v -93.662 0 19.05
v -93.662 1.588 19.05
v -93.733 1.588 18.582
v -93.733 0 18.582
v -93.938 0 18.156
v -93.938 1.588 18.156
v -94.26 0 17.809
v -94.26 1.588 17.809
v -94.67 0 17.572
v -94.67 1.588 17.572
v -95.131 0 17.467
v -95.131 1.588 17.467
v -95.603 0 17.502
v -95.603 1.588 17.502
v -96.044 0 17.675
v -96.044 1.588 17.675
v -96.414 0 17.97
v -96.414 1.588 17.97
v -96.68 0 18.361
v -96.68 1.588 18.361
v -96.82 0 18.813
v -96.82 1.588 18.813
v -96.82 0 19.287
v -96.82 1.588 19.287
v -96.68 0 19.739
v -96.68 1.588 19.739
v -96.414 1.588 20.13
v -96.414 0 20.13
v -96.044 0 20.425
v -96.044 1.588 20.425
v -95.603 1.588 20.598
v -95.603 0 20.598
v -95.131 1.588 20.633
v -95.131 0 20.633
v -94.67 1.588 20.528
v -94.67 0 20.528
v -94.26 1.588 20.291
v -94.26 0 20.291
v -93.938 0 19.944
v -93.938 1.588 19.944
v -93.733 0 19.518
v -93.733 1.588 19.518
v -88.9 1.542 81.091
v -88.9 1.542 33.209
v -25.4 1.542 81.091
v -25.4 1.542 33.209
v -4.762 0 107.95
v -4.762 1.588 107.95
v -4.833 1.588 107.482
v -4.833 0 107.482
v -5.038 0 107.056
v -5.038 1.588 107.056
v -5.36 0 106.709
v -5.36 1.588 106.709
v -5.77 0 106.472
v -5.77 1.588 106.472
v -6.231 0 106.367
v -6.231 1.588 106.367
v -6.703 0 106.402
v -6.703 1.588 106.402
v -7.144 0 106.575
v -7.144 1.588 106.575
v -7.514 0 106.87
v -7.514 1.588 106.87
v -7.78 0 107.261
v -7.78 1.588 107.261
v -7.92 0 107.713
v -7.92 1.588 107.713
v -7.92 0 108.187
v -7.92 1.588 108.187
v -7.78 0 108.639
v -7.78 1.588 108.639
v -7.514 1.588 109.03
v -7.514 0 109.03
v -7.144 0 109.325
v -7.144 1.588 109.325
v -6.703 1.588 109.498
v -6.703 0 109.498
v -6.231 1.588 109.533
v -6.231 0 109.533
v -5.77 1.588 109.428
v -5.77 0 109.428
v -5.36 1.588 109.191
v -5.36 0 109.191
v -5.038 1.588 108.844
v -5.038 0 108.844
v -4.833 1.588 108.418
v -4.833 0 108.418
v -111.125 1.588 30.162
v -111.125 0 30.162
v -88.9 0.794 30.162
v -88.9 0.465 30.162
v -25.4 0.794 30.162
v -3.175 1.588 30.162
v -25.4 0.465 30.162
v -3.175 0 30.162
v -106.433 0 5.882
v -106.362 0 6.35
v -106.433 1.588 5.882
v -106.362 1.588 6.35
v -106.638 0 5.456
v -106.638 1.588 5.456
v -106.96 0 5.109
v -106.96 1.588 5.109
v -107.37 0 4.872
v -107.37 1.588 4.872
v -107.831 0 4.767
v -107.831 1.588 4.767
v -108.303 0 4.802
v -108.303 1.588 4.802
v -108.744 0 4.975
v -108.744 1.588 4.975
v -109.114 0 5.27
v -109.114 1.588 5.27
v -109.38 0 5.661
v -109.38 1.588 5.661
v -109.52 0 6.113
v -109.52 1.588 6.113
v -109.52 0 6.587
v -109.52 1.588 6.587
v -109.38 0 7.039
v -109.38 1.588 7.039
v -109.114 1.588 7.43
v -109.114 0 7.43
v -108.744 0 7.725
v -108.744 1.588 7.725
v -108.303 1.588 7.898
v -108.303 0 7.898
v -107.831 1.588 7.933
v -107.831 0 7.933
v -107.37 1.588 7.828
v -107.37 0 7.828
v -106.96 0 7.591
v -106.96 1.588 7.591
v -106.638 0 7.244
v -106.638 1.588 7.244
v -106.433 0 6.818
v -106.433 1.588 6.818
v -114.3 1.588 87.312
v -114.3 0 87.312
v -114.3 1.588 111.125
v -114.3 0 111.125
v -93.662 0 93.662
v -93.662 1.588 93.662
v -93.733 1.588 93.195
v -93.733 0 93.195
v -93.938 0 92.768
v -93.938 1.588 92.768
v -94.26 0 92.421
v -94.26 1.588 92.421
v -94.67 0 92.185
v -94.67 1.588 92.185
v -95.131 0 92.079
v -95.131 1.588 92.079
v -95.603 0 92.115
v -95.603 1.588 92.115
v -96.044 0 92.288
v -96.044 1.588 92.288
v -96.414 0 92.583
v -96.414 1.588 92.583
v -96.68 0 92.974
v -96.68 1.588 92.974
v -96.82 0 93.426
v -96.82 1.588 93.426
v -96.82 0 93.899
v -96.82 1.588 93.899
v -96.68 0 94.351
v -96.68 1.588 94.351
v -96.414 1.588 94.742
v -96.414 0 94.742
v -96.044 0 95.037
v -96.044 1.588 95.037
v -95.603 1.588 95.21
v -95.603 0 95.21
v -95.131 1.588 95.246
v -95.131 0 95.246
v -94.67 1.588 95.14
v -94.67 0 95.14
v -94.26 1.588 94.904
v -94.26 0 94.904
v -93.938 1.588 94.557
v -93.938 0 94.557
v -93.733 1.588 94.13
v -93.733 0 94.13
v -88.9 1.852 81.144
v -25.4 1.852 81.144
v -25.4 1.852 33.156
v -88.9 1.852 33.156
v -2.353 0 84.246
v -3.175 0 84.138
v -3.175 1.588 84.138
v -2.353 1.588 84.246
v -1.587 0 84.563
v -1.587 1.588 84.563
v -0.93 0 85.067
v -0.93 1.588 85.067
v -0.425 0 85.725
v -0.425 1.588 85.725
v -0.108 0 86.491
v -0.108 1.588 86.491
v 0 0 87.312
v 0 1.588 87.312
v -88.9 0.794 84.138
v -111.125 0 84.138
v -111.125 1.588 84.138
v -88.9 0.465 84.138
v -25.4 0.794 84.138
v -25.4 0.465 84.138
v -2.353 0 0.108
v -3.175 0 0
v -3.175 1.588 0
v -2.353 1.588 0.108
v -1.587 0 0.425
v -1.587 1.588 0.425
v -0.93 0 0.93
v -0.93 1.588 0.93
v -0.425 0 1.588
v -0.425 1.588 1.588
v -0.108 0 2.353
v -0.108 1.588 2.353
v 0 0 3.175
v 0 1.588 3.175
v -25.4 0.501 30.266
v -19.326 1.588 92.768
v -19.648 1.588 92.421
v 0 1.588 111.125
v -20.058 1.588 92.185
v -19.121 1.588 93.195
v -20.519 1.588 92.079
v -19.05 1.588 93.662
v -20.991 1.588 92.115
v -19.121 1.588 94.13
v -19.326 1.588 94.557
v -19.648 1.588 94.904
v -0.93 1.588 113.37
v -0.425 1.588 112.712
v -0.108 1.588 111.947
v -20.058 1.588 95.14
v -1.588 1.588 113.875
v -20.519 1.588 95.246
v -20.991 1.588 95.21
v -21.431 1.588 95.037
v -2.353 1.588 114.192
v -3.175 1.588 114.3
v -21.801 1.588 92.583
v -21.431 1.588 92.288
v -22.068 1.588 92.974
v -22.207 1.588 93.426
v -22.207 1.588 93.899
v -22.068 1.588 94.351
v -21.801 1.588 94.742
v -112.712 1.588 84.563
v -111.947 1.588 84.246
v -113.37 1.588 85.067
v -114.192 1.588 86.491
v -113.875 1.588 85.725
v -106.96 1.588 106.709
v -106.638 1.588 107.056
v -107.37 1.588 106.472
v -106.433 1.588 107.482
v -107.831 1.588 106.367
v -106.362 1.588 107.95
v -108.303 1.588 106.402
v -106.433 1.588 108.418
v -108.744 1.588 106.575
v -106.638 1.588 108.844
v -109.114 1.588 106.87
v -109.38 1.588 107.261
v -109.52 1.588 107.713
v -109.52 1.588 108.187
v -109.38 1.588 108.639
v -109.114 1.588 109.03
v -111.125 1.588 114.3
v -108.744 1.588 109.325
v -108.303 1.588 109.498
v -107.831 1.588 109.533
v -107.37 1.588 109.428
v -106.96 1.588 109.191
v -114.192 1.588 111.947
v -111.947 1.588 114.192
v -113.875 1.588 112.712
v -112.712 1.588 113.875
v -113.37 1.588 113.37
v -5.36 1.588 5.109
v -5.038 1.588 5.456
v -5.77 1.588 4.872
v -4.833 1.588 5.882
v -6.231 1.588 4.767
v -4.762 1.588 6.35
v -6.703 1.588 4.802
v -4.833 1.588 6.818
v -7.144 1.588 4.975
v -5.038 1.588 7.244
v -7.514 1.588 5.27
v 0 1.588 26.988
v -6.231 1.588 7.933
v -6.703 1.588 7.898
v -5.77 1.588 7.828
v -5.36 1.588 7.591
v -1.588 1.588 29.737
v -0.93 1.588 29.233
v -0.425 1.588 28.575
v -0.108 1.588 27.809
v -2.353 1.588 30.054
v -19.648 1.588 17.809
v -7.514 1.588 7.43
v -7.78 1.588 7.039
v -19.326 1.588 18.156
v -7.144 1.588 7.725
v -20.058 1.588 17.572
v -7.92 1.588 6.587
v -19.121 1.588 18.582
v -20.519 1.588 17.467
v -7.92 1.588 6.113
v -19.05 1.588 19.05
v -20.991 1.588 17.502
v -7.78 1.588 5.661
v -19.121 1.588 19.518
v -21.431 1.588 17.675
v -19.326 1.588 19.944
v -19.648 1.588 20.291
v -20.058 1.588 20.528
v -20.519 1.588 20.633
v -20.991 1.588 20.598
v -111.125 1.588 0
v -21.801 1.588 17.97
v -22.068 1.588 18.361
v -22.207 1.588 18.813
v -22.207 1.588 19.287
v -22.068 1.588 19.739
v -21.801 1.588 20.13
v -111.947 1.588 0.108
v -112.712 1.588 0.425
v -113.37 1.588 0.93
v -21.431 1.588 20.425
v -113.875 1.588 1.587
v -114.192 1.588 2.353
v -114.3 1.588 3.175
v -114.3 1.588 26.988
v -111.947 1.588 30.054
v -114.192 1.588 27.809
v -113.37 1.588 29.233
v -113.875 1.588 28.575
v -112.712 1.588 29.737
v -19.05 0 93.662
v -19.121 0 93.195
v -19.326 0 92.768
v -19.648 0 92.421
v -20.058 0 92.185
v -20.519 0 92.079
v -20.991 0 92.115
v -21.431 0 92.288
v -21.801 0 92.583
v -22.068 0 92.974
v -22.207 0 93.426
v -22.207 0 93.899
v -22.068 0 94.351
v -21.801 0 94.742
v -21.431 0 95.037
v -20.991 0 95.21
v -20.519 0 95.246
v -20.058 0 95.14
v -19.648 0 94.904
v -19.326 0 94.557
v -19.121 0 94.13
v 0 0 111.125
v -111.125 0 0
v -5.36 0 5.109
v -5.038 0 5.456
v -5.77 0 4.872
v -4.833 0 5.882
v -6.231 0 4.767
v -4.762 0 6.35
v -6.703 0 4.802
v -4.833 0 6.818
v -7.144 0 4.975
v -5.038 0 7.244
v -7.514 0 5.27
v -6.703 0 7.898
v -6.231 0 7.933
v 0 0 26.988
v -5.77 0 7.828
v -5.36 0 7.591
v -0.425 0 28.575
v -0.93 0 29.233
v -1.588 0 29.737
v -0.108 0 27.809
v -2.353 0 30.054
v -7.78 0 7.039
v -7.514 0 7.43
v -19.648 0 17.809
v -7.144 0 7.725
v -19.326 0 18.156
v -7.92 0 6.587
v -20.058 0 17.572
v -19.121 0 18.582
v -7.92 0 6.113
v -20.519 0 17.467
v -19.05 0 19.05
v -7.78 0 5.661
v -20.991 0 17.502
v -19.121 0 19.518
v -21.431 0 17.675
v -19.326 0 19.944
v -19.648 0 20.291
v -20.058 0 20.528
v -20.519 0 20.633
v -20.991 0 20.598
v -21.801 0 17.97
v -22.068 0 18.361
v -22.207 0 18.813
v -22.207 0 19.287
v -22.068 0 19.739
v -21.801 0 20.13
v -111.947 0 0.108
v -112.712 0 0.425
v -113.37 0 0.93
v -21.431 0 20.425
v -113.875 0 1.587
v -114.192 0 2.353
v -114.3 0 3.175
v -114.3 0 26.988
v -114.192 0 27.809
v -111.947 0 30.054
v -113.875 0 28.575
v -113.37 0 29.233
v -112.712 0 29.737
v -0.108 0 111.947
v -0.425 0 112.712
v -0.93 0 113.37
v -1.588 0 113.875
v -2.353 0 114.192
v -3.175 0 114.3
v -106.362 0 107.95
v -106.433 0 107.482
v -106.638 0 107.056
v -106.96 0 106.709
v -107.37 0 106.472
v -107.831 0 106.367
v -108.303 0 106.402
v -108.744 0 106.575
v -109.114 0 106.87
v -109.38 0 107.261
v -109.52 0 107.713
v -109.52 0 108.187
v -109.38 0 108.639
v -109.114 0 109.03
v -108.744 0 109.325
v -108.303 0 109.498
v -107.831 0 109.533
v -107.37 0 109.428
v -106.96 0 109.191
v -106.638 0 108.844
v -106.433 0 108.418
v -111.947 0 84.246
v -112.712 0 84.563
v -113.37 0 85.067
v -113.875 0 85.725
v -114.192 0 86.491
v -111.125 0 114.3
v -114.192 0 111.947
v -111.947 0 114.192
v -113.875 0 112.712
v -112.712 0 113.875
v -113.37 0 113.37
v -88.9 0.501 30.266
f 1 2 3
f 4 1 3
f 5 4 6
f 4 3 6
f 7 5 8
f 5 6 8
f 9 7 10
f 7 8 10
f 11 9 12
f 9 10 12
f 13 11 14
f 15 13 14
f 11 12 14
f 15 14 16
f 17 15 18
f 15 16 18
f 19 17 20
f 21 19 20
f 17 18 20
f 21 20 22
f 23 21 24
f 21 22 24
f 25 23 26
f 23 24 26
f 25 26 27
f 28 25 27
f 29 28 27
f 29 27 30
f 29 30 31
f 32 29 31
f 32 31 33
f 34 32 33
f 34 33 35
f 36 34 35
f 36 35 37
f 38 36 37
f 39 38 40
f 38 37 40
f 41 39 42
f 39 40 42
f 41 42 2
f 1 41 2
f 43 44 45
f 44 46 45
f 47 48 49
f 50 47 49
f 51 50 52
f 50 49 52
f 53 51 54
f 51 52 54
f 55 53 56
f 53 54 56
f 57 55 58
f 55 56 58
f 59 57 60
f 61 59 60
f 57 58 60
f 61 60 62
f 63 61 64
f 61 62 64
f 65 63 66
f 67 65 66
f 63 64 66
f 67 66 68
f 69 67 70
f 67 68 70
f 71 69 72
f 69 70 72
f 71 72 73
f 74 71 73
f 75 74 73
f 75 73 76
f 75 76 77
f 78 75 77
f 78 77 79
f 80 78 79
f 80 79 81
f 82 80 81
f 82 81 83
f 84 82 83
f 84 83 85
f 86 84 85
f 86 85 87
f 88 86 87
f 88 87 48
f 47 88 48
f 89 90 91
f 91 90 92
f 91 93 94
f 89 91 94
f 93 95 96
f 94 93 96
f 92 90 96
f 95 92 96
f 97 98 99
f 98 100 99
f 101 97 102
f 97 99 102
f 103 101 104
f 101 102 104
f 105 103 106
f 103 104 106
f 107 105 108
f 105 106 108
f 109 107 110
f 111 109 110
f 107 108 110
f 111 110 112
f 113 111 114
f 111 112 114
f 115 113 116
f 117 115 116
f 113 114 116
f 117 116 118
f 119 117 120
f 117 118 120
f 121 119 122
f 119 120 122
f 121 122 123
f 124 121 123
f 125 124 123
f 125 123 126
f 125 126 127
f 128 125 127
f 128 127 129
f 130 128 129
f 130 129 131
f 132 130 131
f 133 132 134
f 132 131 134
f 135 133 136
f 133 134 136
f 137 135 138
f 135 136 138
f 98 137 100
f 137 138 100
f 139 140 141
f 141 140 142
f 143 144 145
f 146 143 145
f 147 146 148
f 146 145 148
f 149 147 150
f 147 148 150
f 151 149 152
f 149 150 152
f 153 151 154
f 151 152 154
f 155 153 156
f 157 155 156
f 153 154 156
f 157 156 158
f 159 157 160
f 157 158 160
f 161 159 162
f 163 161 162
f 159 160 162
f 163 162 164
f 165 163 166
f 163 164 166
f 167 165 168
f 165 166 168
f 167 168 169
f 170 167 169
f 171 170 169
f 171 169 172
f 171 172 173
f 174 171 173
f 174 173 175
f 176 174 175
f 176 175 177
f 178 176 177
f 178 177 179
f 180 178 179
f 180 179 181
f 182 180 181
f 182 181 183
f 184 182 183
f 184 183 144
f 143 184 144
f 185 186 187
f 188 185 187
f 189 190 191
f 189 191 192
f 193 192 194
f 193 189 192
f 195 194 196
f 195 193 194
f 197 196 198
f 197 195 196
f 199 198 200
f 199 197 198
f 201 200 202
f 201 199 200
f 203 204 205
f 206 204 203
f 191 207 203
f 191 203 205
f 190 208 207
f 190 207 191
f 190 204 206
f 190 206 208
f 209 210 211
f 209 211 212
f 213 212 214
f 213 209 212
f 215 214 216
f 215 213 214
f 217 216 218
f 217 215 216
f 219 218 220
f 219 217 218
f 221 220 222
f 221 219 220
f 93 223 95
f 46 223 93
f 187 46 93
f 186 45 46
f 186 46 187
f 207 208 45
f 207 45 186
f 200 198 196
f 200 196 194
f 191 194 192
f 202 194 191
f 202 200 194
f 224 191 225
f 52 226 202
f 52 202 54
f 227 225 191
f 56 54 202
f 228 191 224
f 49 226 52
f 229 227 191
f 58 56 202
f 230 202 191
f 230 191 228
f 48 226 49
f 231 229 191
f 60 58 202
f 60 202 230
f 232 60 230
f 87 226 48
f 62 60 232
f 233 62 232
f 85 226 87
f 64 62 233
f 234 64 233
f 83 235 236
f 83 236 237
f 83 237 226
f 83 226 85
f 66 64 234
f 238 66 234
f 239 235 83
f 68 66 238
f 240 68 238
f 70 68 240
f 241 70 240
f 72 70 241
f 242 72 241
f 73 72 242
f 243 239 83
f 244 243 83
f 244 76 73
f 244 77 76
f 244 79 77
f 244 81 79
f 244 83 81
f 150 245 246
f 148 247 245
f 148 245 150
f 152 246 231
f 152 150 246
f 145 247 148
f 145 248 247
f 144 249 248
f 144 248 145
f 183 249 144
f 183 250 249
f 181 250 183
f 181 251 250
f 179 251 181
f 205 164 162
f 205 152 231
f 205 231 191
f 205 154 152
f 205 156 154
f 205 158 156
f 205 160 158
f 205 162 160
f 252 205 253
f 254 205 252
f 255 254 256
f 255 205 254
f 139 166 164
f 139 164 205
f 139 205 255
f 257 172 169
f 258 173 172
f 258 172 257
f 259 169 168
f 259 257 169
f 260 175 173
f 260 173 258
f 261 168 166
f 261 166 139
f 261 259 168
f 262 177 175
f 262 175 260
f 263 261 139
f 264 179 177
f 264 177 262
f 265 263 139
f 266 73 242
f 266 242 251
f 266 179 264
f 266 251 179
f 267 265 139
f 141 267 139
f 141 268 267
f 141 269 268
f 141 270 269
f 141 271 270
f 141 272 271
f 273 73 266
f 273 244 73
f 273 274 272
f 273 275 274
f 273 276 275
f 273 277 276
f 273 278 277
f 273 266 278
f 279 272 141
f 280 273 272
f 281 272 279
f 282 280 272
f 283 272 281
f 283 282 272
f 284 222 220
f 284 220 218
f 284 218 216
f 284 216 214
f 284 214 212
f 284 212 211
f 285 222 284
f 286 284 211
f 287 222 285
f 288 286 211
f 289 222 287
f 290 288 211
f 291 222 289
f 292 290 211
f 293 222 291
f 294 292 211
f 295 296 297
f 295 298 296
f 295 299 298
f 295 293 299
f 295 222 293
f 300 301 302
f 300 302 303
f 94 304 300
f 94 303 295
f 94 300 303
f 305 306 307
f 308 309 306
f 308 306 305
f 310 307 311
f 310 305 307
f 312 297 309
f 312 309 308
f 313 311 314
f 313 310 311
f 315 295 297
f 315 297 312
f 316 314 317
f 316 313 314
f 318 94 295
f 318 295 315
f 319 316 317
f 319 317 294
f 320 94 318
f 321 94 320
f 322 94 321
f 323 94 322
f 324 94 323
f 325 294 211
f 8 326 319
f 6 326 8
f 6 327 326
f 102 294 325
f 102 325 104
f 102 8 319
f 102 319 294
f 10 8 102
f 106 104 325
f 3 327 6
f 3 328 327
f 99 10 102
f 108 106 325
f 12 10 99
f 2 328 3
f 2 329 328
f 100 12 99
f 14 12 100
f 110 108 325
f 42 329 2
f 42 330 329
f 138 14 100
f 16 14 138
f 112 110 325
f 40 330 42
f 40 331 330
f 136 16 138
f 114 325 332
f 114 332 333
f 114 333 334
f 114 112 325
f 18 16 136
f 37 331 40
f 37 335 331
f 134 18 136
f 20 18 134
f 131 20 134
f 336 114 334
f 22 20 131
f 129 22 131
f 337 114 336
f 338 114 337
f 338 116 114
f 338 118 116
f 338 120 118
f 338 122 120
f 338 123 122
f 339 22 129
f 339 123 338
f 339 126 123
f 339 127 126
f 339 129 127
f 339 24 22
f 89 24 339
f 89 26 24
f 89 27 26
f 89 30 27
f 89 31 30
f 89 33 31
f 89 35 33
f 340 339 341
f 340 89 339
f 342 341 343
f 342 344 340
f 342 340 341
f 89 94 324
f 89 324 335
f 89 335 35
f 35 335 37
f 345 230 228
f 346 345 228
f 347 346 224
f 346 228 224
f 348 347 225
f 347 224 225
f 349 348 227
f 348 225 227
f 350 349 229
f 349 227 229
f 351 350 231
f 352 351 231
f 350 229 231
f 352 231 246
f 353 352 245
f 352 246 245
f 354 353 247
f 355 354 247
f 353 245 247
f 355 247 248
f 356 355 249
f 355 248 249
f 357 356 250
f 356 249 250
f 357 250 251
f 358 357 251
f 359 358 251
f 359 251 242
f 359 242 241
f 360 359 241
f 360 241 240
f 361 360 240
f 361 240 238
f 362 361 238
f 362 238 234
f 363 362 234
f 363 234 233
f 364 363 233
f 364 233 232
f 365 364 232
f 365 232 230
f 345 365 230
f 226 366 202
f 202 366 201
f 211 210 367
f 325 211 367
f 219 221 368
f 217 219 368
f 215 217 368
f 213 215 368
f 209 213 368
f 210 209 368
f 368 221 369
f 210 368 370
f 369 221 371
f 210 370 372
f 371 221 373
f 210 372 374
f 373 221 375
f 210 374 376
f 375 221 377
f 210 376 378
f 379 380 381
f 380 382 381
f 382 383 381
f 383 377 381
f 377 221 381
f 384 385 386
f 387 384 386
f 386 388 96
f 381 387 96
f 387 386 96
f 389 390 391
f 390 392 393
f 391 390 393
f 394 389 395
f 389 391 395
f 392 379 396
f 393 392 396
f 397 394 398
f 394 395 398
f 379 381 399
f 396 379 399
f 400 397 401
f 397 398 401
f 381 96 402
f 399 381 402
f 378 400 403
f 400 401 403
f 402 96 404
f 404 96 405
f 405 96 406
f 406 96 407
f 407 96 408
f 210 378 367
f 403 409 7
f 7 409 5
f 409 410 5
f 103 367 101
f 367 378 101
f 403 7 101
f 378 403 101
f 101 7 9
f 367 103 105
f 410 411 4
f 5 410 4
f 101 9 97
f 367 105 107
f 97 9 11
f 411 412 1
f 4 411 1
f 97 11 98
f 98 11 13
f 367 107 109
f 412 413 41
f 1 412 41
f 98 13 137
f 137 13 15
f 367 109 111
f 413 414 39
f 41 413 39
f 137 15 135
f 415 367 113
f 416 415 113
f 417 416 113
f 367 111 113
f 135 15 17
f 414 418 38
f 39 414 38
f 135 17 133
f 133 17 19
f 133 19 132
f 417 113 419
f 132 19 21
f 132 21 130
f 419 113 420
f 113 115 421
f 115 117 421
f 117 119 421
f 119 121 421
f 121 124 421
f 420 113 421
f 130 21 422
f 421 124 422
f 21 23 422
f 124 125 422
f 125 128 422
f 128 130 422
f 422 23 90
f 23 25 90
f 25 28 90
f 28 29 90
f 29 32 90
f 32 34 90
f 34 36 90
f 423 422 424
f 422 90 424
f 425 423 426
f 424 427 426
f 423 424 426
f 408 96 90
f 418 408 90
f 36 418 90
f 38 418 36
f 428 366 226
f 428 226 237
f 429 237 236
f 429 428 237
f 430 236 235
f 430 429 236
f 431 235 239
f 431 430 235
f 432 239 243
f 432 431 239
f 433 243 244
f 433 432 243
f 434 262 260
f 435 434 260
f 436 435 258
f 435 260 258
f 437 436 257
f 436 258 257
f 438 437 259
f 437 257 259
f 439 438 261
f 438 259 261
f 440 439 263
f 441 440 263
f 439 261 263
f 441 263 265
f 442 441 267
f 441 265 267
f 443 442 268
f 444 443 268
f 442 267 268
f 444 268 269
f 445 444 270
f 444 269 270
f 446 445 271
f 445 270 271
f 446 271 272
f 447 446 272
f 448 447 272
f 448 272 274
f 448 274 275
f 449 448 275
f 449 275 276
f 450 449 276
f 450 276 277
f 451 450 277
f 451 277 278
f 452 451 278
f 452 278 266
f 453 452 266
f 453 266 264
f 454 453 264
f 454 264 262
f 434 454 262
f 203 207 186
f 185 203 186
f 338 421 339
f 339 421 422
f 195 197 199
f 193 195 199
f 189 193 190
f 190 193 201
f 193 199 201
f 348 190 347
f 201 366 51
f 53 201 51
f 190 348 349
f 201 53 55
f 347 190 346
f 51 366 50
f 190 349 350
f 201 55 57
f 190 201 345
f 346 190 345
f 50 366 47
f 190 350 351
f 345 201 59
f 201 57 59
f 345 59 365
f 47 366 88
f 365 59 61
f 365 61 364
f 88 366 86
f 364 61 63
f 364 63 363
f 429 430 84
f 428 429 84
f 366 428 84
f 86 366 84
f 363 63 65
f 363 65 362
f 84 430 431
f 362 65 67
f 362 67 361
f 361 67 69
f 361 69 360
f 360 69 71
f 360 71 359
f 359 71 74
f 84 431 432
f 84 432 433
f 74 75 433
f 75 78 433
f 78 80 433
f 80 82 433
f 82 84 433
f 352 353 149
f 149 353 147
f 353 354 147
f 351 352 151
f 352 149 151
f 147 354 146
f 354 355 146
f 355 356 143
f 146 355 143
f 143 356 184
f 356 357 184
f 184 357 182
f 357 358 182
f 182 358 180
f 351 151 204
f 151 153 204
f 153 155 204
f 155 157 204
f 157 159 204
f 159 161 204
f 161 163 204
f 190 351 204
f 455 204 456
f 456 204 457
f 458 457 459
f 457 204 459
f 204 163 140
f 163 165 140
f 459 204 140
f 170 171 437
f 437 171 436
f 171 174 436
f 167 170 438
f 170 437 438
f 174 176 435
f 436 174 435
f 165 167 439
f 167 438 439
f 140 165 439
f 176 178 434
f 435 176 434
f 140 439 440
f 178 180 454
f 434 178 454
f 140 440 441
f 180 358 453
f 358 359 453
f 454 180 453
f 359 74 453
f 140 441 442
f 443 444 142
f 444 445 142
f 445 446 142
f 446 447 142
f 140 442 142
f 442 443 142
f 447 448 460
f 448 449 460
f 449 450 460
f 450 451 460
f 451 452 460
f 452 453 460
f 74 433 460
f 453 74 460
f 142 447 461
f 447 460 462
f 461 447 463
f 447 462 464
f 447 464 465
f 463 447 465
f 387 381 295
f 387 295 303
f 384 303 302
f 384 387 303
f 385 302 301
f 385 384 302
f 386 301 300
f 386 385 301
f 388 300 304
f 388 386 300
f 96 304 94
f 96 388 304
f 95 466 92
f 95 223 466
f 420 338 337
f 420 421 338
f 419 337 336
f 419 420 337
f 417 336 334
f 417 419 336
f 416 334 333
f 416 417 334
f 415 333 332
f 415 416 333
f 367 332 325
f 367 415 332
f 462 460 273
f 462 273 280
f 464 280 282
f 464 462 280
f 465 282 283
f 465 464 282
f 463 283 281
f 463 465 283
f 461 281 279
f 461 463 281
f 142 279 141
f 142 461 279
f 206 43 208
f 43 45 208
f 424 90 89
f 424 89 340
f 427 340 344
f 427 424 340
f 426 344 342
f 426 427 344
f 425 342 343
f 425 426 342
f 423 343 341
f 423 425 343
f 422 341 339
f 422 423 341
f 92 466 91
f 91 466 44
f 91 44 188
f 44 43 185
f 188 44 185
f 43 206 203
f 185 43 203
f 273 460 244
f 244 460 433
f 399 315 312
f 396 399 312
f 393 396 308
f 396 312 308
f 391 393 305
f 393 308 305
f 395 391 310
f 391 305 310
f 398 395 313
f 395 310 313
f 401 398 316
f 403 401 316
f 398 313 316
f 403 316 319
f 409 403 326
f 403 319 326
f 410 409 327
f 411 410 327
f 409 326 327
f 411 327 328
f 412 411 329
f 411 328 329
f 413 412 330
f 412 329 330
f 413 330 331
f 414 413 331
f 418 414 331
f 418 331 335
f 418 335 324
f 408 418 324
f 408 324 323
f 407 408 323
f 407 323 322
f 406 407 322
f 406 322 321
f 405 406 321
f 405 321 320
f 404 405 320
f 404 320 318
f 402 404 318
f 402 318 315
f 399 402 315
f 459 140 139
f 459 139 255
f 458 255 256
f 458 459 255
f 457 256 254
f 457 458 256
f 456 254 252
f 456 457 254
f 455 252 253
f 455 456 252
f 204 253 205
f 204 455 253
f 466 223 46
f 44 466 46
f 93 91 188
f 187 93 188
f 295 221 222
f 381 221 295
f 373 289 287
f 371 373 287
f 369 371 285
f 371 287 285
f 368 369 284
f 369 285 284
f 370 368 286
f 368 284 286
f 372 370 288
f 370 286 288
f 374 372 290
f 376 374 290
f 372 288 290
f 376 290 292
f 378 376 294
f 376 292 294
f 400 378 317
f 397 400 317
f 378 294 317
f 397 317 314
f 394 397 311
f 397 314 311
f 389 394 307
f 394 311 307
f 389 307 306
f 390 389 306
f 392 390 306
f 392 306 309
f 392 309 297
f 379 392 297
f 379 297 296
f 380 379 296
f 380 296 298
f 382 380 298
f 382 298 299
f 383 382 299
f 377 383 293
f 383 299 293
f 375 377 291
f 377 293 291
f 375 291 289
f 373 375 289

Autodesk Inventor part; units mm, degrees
ref_plane "XZ Plane" through (0, 0, 0) normal (0, 1, 0) x (-1, 0, 0)
ref_plane "XY Plane" through (0, 0, 0) normal (0, 0, 1) x (1, 0, 0)
sketch "Sketch1" plane through (0, 0, 0) normal (0, 1, 0) x (-1, 0, 0)
  line L0 (3.175, 0) -> (111.125, 0)
  line L1 (114.3, 3.175) -> (114.3, 26.9875)
  line L2 (111.125, 30.1625) -> (92.075, 30.1625)
  line L3 (92.075, 84.1375) -> (111.125, 84.1375)
  line L4 (114.3, 87.3125) -> (114.3, 111.125)
  line L5 (111.125, 114.3) -> (3.175, 114.3)
  line L6 (0, 111.125) -> (0, 87.3125)
  line L7 (3.175, 84.1375) -> (22.225, 84.1375)
  line L8 (22.225, 30.1625) -> (3.175, 30.1625)
  line L9 (0, 3.175) -> (0, 26.9875)
  arc A0 (114.3, 111.125) -> (111.125, 114.3) centre (111.125, 111.125) ccw
  arc A1 (111.125, 84.1375) -> (114.3, 87.3125) centre (111.125, 87.3125) ccw
  arc A2 (114.3, 26.9875) -> (111.125, 30.1625) centre (111.125, 26.9875) ccw
  arc A3 (111.125, 0) -> (114.3, 3.175) centre (111.125, 3.175) ccw
  arc A4 (0, 3.175) -> (3.175, 0) centre (3.175, 3.175) ccw
  arc A5 (3.175, 30.1625) -> (0, 26.9875) centre (3.175, 26.9875) ccw
  arc A6 (0, 87.3125) -> (3.175, 84.1375) centre (3.175, 87.3125) ccw
  arc A7 (3.175, 114.3) -> (0, 111.125) centre (3.175, 111.125) ccw
  line L10 (92.075, 84.1375) -> (22.225, 84.1375)
  line L11 (92.075, 30.1625) -> (22.225, 30.1625)
  point P0 (0, 0)
  point P1 (114.3, 0)
  point P2 (114.3, 30.1625)
  point P3 (88.9, 30.1625)
  point P4 (88.9, 84.1375)
  point P5 (114.3, 84.1375)
  point P6 (114.3, 114.3)
  point P7 (0, 114.3)
  point P8 (0, 84.1375)
  point P9 (25.4, 84.1375)
  point P10 (25.4, 30.1625)
  point P11 (0, 30.1625)
  dimension "d0" = 114.3
  dimension "d1" = 30.1625
  dimension "d2" = 25.4
  dimension "d4" = 30.1625
  dimension "d5" = 114.3
  dimension "d6" = 25.4
  dimension "d9" = 3.175
  dimension "d42" = 114.3
extrude "Extrusion1" add sketch "Sketch1" along normal blind 1.5875
ref_plane "Work Plane1" through (-25.4, 0, 0) normal (1, 0, 0) x (0, 1, 0)
sketch "Sketch3" plane through (-25.4, 0, 0) normal (1, 0, 0) x (0, 1, 0)
  line L0 (0, 84.1375) -> (1.5875, 84.1375) projected
  line L1 (0.7937, 84.1375) -> (1.8521, 81.1441)
  line L2 (0.7937, 84.1375) -> (3.9688, 84.1375) construction
  line L3 (0, 30.1625) -> (1.5875, 30.1625) construction
  line L4 (7.9375, 57.15) -> (-6.35, 57.15) construction
  line L5 (1.8521, 81.1441) -> (1.8521, 57.15)
  line L6 (0.7938, 30.1625) -> (1.8521, 33.1559)
  line L7 (1.8521, 33.1559) -> (1.8521, 57.15)
  line L8 (0.5015, 30.2658) -> (1.5421, 33.2091)
  line L9 (1.5421, 33.2091) -> (1.5421, 55.5625)
  line L10 (1.5421, 55.5625) -> (1.5421, 81.0909)
  line L11 (1.5421, 81.0909) -> (0.3554, 84.4475)
  line L12 (0.3554, 84.4475) -> (3.9687, 84.4475)
  line L13 (0.5015, 30.2658) -> (0.465, 30.1625)
  line L14 (0.7938, 30.1625) -> (0.465, 30.1625)
  line L15 (0.7937, 84.1375) -> (0.465, 84.1375)
  point P0 (0, 0)
  dimension "d11" = 3.175
  dimension "d12" = 70.529
extrude "Extrusion2" add sketch "Sketch3" against normal blind 63.5
sketch "Sketch4" plane through (0, 1.5875, 0) normal (0, 1, 0) x (1, 0, 0)
  circle A0 centre (-107.95, -6.35) radius 1.5875
  line L0 (-111.125, -30.1625) -> (-3.175, -30.1625) projected
  line L1 (-114.3, -3.175) -> (-114.3, -26.9875) projected
  circle A1 centre (-6.35, -6.35) radius 1.5875
  circle A2 centre (-107.95, -107.95) radius 1.5875
  circle A3 centre (-6.35, -107.95) radius 1.5875
  line L2 (-3.175, 0) -> (-111.125, 0) projected
  line L3 (-111.125, -114.3) -> (-3.175, -114.3) projected
  line L4 (-107.95, -6.35) -> (-76.5191, -6.35) construction
  line L5 (-107.95, -6.35) -> (-82.55, -6.35) construction
  circle A4 centre (-95.25, -19.05) radius 1.5875
  circle A5 centre (-20.6375, -19.05) radius 1.5875
  circle A6 centre (-95.25, -93.6625) radius 1.5875
  circle A7 centre (-20.6375, -93.6625) radius 1.5875
  line L6 (0, -26.9875) -> (0, -3.175) projected
  point P0 (0, 0)
  point P1 (-114.3, -15.0812)
  dimension "d15" = 3.175
  dimension "d17" = 6.35
  dimension "d28" = 101.6
  dimension "d31" = 101.6
  dimension "d43" = 107.95
  dimension "d48" = 3.175
  dimension "d51" = 74.6125
  dimension "d54" = 74.6125
  dimension "d57" = 95.25
  dimension "d58" = 95.25
extrude "Extrusion4" cut sketch "Sketch4" against normal blind 63.5
properties part number "Monitor Base v1.0"
